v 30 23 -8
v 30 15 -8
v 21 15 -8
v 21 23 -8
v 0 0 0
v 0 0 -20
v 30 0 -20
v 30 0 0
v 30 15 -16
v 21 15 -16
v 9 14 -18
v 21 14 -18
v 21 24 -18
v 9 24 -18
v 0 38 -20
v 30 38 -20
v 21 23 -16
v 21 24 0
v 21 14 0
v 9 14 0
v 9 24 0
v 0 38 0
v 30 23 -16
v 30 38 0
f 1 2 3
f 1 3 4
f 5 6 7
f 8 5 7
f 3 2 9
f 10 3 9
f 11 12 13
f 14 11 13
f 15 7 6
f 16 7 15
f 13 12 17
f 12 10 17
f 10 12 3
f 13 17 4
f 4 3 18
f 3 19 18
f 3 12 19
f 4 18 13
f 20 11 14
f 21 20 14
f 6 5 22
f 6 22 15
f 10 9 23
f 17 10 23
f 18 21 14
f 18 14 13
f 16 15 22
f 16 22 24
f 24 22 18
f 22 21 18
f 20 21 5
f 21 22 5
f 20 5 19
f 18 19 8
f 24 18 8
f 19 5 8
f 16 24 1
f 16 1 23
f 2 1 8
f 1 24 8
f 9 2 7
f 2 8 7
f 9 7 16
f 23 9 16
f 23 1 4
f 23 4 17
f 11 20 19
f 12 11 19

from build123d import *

# Parameters (mm, degrees)
SKETCH1_W           = 30
SKETCH1_H           = 20
BOSS_EXTRUDE1_DEPTH = 38
SKETCH2_W           = 12
SKETCH2_H           = 10
CUT_EXTRUDE1_DEPTH  = 38
SKETCH3_W           = 8
SKETCH3_H           = 8
CUT_EXTRUDE2_DEPTH  = 9
SKETCH4_W           = 2
SKETCH4_H           = 10
BOSS_EXTRUDE2_DEPTH = 12


with BuildPart() as part:
    # Sketch1 → Boss-Extrude1 (new body)
    with BuildSketch(Plane(origin=(0, 0, 0), x_dir=(1, 0, 0), z_dir=(0, 1, 0))):
        with Locations((15, 10)):
            Rectangle(SKETCH1_W, SKETCH1_H)
    extrude(amount=BOSS_EXTRUDE1_DEPTH)

    # Sketch2 → Cut-Extrude1 (cut)
    with BuildSketch(Plane.XY):
        with Locations((15, 19)):
            Rectangle(SKETCH2_W, SKETCH2_H)
    extrude(amount=-CUT_EXTRUDE1_DEPTH, mode=Mode.SUBTRACT)

    # Sketch3 → Cut-Extrude2 (cut)
    with BuildSketch(Plane(origin=(30, 0, 0), x_dir=(0, 0, -1), z_dir=(1, 0, 0))):
        with Locations((12, 19)):
            Rectangle(SKETCH3_W, SKETCH3_H)
    extrude(amount=-CUT_EXTRUDE2_DEPTH, mode=Mode.SUBTRACT)

    # Sketch4 → Boss-Extrude2 (add)
    with BuildSketch(Plane.ZY.offset(-21)):
        with Locations((-19, 19)):
            Rectangle(SKETCH4_W, SKETCH4_H)
    extrude(amount=BOSS_EXTRUDE2_DEPTH)


solid = part.part
